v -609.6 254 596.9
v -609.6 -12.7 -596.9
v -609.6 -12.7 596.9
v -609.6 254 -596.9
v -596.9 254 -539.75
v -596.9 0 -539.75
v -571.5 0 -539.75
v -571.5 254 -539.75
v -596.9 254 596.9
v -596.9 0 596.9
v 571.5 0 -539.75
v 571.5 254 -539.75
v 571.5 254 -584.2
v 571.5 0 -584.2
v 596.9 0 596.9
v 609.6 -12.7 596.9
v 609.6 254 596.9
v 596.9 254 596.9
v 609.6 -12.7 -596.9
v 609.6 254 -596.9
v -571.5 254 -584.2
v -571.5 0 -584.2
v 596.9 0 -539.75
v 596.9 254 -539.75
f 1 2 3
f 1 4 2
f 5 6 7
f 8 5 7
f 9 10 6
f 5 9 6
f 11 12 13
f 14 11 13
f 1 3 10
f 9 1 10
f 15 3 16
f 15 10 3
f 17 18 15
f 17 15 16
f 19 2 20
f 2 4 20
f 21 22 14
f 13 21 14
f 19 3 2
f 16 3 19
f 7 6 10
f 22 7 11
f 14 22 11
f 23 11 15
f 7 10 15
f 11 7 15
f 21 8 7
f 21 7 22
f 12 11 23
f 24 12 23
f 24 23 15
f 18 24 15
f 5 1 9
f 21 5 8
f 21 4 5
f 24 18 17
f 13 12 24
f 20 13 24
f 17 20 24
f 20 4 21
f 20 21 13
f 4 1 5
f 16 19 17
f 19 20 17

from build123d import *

# Parameters (mm, degrees)
BOSS_EXTRUDE1_DEPTH = 254
SKETCH2_W           = 1219.2
SKETCH2_H           = 1193.8
BOSS_EXTRUDE2_DEPTH = 12.7
SKETCH3_W           = 25.4
SKETCH3_H           = 44.45
BOSS_EXTRUDE3_DEPTH = 254


with BuildPart() as part:
    # Sketch1 → Boss-Extrude1 (new body)
    with BuildSketch(Plane(origin=(0, 0, 0), x_dir=(1, 0, 0), z_dir=(0, 1, 0))):
        Polygon((-596.9, -584.2), (-596.9, 584.2), (596.9, 584.2), (596.9, -584.2), (596.9, -596.9), (609.6, -596.9), (609.6, 596.9), (-609.6, 596.9), (-609.6, -596.9), (-596.9, -596.9), align=None)
    extrude(amount=BOSS_EXTRUDE1_DEPTH)

    # Sketch2 → Boss-Extrude2 (add)
    with BuildSketch(Plane.XZ):
        Rectangle(SKETCH2_W, SKETCH2_H)
    extrude(amount=BOSS_EXTRUDE2_DEPTH)

    # Sketch3 → Boss-Extrude3 (add)
    with BuildSketch(Plane(origin=(0, 0, 0), x_dir=(1, 0, 0), z_dir=(0, 1, 0))):
        with Locations((-584.2, 561.975)):
            Rectangle(SKETCH3_W, SKETCH3_H)
        with Locations((584.2, 561.975)):
            Rectangle(SKETCH3_W, SKETCH3_H)
    extrude(amount=BOSS_EXTRUDE3_DEPTH)


solid = part.part
